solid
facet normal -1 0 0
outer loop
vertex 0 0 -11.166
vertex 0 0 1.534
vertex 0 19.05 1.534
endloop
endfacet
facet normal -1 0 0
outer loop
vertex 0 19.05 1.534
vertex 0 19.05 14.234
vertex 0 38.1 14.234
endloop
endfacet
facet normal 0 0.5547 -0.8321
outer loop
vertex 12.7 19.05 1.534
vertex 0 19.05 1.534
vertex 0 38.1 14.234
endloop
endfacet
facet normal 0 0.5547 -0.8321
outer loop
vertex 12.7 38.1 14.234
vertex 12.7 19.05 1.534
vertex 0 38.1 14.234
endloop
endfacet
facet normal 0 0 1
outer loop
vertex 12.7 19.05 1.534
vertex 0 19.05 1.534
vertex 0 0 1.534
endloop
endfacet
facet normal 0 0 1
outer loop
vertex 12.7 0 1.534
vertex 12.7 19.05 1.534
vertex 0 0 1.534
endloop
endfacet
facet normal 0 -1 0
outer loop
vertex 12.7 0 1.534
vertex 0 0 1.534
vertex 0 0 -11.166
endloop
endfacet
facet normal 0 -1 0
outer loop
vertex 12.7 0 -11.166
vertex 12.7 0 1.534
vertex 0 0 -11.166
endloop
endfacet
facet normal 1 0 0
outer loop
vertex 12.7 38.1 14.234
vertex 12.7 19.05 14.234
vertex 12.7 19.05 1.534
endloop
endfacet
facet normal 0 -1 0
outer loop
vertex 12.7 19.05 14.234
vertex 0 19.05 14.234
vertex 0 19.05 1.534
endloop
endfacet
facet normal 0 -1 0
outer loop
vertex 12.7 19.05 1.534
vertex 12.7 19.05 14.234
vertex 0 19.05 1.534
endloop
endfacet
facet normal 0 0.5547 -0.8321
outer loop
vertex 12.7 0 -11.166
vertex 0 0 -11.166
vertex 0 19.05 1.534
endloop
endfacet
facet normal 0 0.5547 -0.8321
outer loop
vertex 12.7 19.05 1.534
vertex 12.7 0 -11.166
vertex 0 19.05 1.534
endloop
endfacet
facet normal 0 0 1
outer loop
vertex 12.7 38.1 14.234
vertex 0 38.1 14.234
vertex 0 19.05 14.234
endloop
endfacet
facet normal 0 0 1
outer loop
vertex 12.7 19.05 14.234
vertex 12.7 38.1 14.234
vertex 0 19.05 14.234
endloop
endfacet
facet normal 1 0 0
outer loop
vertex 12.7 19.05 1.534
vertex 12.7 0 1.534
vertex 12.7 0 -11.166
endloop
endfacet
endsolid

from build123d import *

# Parameters (mm, degrees)
F1_DEPTH = 12.7


with BuildPart() as f1:
    # F0 (on Right) → F1 (new body)
    with BuildSketch(Plane.YZ):
        Polygon((19.05, 1.533672), (38.1, 14.233672), (19.05, 14.233672), align=None)
        Polygon((0, -11.166328), (19.05, 1.533672), (0, 1.533672), align=None)
    extrude(amount=F1_DEPTH)


solid = f1.part
